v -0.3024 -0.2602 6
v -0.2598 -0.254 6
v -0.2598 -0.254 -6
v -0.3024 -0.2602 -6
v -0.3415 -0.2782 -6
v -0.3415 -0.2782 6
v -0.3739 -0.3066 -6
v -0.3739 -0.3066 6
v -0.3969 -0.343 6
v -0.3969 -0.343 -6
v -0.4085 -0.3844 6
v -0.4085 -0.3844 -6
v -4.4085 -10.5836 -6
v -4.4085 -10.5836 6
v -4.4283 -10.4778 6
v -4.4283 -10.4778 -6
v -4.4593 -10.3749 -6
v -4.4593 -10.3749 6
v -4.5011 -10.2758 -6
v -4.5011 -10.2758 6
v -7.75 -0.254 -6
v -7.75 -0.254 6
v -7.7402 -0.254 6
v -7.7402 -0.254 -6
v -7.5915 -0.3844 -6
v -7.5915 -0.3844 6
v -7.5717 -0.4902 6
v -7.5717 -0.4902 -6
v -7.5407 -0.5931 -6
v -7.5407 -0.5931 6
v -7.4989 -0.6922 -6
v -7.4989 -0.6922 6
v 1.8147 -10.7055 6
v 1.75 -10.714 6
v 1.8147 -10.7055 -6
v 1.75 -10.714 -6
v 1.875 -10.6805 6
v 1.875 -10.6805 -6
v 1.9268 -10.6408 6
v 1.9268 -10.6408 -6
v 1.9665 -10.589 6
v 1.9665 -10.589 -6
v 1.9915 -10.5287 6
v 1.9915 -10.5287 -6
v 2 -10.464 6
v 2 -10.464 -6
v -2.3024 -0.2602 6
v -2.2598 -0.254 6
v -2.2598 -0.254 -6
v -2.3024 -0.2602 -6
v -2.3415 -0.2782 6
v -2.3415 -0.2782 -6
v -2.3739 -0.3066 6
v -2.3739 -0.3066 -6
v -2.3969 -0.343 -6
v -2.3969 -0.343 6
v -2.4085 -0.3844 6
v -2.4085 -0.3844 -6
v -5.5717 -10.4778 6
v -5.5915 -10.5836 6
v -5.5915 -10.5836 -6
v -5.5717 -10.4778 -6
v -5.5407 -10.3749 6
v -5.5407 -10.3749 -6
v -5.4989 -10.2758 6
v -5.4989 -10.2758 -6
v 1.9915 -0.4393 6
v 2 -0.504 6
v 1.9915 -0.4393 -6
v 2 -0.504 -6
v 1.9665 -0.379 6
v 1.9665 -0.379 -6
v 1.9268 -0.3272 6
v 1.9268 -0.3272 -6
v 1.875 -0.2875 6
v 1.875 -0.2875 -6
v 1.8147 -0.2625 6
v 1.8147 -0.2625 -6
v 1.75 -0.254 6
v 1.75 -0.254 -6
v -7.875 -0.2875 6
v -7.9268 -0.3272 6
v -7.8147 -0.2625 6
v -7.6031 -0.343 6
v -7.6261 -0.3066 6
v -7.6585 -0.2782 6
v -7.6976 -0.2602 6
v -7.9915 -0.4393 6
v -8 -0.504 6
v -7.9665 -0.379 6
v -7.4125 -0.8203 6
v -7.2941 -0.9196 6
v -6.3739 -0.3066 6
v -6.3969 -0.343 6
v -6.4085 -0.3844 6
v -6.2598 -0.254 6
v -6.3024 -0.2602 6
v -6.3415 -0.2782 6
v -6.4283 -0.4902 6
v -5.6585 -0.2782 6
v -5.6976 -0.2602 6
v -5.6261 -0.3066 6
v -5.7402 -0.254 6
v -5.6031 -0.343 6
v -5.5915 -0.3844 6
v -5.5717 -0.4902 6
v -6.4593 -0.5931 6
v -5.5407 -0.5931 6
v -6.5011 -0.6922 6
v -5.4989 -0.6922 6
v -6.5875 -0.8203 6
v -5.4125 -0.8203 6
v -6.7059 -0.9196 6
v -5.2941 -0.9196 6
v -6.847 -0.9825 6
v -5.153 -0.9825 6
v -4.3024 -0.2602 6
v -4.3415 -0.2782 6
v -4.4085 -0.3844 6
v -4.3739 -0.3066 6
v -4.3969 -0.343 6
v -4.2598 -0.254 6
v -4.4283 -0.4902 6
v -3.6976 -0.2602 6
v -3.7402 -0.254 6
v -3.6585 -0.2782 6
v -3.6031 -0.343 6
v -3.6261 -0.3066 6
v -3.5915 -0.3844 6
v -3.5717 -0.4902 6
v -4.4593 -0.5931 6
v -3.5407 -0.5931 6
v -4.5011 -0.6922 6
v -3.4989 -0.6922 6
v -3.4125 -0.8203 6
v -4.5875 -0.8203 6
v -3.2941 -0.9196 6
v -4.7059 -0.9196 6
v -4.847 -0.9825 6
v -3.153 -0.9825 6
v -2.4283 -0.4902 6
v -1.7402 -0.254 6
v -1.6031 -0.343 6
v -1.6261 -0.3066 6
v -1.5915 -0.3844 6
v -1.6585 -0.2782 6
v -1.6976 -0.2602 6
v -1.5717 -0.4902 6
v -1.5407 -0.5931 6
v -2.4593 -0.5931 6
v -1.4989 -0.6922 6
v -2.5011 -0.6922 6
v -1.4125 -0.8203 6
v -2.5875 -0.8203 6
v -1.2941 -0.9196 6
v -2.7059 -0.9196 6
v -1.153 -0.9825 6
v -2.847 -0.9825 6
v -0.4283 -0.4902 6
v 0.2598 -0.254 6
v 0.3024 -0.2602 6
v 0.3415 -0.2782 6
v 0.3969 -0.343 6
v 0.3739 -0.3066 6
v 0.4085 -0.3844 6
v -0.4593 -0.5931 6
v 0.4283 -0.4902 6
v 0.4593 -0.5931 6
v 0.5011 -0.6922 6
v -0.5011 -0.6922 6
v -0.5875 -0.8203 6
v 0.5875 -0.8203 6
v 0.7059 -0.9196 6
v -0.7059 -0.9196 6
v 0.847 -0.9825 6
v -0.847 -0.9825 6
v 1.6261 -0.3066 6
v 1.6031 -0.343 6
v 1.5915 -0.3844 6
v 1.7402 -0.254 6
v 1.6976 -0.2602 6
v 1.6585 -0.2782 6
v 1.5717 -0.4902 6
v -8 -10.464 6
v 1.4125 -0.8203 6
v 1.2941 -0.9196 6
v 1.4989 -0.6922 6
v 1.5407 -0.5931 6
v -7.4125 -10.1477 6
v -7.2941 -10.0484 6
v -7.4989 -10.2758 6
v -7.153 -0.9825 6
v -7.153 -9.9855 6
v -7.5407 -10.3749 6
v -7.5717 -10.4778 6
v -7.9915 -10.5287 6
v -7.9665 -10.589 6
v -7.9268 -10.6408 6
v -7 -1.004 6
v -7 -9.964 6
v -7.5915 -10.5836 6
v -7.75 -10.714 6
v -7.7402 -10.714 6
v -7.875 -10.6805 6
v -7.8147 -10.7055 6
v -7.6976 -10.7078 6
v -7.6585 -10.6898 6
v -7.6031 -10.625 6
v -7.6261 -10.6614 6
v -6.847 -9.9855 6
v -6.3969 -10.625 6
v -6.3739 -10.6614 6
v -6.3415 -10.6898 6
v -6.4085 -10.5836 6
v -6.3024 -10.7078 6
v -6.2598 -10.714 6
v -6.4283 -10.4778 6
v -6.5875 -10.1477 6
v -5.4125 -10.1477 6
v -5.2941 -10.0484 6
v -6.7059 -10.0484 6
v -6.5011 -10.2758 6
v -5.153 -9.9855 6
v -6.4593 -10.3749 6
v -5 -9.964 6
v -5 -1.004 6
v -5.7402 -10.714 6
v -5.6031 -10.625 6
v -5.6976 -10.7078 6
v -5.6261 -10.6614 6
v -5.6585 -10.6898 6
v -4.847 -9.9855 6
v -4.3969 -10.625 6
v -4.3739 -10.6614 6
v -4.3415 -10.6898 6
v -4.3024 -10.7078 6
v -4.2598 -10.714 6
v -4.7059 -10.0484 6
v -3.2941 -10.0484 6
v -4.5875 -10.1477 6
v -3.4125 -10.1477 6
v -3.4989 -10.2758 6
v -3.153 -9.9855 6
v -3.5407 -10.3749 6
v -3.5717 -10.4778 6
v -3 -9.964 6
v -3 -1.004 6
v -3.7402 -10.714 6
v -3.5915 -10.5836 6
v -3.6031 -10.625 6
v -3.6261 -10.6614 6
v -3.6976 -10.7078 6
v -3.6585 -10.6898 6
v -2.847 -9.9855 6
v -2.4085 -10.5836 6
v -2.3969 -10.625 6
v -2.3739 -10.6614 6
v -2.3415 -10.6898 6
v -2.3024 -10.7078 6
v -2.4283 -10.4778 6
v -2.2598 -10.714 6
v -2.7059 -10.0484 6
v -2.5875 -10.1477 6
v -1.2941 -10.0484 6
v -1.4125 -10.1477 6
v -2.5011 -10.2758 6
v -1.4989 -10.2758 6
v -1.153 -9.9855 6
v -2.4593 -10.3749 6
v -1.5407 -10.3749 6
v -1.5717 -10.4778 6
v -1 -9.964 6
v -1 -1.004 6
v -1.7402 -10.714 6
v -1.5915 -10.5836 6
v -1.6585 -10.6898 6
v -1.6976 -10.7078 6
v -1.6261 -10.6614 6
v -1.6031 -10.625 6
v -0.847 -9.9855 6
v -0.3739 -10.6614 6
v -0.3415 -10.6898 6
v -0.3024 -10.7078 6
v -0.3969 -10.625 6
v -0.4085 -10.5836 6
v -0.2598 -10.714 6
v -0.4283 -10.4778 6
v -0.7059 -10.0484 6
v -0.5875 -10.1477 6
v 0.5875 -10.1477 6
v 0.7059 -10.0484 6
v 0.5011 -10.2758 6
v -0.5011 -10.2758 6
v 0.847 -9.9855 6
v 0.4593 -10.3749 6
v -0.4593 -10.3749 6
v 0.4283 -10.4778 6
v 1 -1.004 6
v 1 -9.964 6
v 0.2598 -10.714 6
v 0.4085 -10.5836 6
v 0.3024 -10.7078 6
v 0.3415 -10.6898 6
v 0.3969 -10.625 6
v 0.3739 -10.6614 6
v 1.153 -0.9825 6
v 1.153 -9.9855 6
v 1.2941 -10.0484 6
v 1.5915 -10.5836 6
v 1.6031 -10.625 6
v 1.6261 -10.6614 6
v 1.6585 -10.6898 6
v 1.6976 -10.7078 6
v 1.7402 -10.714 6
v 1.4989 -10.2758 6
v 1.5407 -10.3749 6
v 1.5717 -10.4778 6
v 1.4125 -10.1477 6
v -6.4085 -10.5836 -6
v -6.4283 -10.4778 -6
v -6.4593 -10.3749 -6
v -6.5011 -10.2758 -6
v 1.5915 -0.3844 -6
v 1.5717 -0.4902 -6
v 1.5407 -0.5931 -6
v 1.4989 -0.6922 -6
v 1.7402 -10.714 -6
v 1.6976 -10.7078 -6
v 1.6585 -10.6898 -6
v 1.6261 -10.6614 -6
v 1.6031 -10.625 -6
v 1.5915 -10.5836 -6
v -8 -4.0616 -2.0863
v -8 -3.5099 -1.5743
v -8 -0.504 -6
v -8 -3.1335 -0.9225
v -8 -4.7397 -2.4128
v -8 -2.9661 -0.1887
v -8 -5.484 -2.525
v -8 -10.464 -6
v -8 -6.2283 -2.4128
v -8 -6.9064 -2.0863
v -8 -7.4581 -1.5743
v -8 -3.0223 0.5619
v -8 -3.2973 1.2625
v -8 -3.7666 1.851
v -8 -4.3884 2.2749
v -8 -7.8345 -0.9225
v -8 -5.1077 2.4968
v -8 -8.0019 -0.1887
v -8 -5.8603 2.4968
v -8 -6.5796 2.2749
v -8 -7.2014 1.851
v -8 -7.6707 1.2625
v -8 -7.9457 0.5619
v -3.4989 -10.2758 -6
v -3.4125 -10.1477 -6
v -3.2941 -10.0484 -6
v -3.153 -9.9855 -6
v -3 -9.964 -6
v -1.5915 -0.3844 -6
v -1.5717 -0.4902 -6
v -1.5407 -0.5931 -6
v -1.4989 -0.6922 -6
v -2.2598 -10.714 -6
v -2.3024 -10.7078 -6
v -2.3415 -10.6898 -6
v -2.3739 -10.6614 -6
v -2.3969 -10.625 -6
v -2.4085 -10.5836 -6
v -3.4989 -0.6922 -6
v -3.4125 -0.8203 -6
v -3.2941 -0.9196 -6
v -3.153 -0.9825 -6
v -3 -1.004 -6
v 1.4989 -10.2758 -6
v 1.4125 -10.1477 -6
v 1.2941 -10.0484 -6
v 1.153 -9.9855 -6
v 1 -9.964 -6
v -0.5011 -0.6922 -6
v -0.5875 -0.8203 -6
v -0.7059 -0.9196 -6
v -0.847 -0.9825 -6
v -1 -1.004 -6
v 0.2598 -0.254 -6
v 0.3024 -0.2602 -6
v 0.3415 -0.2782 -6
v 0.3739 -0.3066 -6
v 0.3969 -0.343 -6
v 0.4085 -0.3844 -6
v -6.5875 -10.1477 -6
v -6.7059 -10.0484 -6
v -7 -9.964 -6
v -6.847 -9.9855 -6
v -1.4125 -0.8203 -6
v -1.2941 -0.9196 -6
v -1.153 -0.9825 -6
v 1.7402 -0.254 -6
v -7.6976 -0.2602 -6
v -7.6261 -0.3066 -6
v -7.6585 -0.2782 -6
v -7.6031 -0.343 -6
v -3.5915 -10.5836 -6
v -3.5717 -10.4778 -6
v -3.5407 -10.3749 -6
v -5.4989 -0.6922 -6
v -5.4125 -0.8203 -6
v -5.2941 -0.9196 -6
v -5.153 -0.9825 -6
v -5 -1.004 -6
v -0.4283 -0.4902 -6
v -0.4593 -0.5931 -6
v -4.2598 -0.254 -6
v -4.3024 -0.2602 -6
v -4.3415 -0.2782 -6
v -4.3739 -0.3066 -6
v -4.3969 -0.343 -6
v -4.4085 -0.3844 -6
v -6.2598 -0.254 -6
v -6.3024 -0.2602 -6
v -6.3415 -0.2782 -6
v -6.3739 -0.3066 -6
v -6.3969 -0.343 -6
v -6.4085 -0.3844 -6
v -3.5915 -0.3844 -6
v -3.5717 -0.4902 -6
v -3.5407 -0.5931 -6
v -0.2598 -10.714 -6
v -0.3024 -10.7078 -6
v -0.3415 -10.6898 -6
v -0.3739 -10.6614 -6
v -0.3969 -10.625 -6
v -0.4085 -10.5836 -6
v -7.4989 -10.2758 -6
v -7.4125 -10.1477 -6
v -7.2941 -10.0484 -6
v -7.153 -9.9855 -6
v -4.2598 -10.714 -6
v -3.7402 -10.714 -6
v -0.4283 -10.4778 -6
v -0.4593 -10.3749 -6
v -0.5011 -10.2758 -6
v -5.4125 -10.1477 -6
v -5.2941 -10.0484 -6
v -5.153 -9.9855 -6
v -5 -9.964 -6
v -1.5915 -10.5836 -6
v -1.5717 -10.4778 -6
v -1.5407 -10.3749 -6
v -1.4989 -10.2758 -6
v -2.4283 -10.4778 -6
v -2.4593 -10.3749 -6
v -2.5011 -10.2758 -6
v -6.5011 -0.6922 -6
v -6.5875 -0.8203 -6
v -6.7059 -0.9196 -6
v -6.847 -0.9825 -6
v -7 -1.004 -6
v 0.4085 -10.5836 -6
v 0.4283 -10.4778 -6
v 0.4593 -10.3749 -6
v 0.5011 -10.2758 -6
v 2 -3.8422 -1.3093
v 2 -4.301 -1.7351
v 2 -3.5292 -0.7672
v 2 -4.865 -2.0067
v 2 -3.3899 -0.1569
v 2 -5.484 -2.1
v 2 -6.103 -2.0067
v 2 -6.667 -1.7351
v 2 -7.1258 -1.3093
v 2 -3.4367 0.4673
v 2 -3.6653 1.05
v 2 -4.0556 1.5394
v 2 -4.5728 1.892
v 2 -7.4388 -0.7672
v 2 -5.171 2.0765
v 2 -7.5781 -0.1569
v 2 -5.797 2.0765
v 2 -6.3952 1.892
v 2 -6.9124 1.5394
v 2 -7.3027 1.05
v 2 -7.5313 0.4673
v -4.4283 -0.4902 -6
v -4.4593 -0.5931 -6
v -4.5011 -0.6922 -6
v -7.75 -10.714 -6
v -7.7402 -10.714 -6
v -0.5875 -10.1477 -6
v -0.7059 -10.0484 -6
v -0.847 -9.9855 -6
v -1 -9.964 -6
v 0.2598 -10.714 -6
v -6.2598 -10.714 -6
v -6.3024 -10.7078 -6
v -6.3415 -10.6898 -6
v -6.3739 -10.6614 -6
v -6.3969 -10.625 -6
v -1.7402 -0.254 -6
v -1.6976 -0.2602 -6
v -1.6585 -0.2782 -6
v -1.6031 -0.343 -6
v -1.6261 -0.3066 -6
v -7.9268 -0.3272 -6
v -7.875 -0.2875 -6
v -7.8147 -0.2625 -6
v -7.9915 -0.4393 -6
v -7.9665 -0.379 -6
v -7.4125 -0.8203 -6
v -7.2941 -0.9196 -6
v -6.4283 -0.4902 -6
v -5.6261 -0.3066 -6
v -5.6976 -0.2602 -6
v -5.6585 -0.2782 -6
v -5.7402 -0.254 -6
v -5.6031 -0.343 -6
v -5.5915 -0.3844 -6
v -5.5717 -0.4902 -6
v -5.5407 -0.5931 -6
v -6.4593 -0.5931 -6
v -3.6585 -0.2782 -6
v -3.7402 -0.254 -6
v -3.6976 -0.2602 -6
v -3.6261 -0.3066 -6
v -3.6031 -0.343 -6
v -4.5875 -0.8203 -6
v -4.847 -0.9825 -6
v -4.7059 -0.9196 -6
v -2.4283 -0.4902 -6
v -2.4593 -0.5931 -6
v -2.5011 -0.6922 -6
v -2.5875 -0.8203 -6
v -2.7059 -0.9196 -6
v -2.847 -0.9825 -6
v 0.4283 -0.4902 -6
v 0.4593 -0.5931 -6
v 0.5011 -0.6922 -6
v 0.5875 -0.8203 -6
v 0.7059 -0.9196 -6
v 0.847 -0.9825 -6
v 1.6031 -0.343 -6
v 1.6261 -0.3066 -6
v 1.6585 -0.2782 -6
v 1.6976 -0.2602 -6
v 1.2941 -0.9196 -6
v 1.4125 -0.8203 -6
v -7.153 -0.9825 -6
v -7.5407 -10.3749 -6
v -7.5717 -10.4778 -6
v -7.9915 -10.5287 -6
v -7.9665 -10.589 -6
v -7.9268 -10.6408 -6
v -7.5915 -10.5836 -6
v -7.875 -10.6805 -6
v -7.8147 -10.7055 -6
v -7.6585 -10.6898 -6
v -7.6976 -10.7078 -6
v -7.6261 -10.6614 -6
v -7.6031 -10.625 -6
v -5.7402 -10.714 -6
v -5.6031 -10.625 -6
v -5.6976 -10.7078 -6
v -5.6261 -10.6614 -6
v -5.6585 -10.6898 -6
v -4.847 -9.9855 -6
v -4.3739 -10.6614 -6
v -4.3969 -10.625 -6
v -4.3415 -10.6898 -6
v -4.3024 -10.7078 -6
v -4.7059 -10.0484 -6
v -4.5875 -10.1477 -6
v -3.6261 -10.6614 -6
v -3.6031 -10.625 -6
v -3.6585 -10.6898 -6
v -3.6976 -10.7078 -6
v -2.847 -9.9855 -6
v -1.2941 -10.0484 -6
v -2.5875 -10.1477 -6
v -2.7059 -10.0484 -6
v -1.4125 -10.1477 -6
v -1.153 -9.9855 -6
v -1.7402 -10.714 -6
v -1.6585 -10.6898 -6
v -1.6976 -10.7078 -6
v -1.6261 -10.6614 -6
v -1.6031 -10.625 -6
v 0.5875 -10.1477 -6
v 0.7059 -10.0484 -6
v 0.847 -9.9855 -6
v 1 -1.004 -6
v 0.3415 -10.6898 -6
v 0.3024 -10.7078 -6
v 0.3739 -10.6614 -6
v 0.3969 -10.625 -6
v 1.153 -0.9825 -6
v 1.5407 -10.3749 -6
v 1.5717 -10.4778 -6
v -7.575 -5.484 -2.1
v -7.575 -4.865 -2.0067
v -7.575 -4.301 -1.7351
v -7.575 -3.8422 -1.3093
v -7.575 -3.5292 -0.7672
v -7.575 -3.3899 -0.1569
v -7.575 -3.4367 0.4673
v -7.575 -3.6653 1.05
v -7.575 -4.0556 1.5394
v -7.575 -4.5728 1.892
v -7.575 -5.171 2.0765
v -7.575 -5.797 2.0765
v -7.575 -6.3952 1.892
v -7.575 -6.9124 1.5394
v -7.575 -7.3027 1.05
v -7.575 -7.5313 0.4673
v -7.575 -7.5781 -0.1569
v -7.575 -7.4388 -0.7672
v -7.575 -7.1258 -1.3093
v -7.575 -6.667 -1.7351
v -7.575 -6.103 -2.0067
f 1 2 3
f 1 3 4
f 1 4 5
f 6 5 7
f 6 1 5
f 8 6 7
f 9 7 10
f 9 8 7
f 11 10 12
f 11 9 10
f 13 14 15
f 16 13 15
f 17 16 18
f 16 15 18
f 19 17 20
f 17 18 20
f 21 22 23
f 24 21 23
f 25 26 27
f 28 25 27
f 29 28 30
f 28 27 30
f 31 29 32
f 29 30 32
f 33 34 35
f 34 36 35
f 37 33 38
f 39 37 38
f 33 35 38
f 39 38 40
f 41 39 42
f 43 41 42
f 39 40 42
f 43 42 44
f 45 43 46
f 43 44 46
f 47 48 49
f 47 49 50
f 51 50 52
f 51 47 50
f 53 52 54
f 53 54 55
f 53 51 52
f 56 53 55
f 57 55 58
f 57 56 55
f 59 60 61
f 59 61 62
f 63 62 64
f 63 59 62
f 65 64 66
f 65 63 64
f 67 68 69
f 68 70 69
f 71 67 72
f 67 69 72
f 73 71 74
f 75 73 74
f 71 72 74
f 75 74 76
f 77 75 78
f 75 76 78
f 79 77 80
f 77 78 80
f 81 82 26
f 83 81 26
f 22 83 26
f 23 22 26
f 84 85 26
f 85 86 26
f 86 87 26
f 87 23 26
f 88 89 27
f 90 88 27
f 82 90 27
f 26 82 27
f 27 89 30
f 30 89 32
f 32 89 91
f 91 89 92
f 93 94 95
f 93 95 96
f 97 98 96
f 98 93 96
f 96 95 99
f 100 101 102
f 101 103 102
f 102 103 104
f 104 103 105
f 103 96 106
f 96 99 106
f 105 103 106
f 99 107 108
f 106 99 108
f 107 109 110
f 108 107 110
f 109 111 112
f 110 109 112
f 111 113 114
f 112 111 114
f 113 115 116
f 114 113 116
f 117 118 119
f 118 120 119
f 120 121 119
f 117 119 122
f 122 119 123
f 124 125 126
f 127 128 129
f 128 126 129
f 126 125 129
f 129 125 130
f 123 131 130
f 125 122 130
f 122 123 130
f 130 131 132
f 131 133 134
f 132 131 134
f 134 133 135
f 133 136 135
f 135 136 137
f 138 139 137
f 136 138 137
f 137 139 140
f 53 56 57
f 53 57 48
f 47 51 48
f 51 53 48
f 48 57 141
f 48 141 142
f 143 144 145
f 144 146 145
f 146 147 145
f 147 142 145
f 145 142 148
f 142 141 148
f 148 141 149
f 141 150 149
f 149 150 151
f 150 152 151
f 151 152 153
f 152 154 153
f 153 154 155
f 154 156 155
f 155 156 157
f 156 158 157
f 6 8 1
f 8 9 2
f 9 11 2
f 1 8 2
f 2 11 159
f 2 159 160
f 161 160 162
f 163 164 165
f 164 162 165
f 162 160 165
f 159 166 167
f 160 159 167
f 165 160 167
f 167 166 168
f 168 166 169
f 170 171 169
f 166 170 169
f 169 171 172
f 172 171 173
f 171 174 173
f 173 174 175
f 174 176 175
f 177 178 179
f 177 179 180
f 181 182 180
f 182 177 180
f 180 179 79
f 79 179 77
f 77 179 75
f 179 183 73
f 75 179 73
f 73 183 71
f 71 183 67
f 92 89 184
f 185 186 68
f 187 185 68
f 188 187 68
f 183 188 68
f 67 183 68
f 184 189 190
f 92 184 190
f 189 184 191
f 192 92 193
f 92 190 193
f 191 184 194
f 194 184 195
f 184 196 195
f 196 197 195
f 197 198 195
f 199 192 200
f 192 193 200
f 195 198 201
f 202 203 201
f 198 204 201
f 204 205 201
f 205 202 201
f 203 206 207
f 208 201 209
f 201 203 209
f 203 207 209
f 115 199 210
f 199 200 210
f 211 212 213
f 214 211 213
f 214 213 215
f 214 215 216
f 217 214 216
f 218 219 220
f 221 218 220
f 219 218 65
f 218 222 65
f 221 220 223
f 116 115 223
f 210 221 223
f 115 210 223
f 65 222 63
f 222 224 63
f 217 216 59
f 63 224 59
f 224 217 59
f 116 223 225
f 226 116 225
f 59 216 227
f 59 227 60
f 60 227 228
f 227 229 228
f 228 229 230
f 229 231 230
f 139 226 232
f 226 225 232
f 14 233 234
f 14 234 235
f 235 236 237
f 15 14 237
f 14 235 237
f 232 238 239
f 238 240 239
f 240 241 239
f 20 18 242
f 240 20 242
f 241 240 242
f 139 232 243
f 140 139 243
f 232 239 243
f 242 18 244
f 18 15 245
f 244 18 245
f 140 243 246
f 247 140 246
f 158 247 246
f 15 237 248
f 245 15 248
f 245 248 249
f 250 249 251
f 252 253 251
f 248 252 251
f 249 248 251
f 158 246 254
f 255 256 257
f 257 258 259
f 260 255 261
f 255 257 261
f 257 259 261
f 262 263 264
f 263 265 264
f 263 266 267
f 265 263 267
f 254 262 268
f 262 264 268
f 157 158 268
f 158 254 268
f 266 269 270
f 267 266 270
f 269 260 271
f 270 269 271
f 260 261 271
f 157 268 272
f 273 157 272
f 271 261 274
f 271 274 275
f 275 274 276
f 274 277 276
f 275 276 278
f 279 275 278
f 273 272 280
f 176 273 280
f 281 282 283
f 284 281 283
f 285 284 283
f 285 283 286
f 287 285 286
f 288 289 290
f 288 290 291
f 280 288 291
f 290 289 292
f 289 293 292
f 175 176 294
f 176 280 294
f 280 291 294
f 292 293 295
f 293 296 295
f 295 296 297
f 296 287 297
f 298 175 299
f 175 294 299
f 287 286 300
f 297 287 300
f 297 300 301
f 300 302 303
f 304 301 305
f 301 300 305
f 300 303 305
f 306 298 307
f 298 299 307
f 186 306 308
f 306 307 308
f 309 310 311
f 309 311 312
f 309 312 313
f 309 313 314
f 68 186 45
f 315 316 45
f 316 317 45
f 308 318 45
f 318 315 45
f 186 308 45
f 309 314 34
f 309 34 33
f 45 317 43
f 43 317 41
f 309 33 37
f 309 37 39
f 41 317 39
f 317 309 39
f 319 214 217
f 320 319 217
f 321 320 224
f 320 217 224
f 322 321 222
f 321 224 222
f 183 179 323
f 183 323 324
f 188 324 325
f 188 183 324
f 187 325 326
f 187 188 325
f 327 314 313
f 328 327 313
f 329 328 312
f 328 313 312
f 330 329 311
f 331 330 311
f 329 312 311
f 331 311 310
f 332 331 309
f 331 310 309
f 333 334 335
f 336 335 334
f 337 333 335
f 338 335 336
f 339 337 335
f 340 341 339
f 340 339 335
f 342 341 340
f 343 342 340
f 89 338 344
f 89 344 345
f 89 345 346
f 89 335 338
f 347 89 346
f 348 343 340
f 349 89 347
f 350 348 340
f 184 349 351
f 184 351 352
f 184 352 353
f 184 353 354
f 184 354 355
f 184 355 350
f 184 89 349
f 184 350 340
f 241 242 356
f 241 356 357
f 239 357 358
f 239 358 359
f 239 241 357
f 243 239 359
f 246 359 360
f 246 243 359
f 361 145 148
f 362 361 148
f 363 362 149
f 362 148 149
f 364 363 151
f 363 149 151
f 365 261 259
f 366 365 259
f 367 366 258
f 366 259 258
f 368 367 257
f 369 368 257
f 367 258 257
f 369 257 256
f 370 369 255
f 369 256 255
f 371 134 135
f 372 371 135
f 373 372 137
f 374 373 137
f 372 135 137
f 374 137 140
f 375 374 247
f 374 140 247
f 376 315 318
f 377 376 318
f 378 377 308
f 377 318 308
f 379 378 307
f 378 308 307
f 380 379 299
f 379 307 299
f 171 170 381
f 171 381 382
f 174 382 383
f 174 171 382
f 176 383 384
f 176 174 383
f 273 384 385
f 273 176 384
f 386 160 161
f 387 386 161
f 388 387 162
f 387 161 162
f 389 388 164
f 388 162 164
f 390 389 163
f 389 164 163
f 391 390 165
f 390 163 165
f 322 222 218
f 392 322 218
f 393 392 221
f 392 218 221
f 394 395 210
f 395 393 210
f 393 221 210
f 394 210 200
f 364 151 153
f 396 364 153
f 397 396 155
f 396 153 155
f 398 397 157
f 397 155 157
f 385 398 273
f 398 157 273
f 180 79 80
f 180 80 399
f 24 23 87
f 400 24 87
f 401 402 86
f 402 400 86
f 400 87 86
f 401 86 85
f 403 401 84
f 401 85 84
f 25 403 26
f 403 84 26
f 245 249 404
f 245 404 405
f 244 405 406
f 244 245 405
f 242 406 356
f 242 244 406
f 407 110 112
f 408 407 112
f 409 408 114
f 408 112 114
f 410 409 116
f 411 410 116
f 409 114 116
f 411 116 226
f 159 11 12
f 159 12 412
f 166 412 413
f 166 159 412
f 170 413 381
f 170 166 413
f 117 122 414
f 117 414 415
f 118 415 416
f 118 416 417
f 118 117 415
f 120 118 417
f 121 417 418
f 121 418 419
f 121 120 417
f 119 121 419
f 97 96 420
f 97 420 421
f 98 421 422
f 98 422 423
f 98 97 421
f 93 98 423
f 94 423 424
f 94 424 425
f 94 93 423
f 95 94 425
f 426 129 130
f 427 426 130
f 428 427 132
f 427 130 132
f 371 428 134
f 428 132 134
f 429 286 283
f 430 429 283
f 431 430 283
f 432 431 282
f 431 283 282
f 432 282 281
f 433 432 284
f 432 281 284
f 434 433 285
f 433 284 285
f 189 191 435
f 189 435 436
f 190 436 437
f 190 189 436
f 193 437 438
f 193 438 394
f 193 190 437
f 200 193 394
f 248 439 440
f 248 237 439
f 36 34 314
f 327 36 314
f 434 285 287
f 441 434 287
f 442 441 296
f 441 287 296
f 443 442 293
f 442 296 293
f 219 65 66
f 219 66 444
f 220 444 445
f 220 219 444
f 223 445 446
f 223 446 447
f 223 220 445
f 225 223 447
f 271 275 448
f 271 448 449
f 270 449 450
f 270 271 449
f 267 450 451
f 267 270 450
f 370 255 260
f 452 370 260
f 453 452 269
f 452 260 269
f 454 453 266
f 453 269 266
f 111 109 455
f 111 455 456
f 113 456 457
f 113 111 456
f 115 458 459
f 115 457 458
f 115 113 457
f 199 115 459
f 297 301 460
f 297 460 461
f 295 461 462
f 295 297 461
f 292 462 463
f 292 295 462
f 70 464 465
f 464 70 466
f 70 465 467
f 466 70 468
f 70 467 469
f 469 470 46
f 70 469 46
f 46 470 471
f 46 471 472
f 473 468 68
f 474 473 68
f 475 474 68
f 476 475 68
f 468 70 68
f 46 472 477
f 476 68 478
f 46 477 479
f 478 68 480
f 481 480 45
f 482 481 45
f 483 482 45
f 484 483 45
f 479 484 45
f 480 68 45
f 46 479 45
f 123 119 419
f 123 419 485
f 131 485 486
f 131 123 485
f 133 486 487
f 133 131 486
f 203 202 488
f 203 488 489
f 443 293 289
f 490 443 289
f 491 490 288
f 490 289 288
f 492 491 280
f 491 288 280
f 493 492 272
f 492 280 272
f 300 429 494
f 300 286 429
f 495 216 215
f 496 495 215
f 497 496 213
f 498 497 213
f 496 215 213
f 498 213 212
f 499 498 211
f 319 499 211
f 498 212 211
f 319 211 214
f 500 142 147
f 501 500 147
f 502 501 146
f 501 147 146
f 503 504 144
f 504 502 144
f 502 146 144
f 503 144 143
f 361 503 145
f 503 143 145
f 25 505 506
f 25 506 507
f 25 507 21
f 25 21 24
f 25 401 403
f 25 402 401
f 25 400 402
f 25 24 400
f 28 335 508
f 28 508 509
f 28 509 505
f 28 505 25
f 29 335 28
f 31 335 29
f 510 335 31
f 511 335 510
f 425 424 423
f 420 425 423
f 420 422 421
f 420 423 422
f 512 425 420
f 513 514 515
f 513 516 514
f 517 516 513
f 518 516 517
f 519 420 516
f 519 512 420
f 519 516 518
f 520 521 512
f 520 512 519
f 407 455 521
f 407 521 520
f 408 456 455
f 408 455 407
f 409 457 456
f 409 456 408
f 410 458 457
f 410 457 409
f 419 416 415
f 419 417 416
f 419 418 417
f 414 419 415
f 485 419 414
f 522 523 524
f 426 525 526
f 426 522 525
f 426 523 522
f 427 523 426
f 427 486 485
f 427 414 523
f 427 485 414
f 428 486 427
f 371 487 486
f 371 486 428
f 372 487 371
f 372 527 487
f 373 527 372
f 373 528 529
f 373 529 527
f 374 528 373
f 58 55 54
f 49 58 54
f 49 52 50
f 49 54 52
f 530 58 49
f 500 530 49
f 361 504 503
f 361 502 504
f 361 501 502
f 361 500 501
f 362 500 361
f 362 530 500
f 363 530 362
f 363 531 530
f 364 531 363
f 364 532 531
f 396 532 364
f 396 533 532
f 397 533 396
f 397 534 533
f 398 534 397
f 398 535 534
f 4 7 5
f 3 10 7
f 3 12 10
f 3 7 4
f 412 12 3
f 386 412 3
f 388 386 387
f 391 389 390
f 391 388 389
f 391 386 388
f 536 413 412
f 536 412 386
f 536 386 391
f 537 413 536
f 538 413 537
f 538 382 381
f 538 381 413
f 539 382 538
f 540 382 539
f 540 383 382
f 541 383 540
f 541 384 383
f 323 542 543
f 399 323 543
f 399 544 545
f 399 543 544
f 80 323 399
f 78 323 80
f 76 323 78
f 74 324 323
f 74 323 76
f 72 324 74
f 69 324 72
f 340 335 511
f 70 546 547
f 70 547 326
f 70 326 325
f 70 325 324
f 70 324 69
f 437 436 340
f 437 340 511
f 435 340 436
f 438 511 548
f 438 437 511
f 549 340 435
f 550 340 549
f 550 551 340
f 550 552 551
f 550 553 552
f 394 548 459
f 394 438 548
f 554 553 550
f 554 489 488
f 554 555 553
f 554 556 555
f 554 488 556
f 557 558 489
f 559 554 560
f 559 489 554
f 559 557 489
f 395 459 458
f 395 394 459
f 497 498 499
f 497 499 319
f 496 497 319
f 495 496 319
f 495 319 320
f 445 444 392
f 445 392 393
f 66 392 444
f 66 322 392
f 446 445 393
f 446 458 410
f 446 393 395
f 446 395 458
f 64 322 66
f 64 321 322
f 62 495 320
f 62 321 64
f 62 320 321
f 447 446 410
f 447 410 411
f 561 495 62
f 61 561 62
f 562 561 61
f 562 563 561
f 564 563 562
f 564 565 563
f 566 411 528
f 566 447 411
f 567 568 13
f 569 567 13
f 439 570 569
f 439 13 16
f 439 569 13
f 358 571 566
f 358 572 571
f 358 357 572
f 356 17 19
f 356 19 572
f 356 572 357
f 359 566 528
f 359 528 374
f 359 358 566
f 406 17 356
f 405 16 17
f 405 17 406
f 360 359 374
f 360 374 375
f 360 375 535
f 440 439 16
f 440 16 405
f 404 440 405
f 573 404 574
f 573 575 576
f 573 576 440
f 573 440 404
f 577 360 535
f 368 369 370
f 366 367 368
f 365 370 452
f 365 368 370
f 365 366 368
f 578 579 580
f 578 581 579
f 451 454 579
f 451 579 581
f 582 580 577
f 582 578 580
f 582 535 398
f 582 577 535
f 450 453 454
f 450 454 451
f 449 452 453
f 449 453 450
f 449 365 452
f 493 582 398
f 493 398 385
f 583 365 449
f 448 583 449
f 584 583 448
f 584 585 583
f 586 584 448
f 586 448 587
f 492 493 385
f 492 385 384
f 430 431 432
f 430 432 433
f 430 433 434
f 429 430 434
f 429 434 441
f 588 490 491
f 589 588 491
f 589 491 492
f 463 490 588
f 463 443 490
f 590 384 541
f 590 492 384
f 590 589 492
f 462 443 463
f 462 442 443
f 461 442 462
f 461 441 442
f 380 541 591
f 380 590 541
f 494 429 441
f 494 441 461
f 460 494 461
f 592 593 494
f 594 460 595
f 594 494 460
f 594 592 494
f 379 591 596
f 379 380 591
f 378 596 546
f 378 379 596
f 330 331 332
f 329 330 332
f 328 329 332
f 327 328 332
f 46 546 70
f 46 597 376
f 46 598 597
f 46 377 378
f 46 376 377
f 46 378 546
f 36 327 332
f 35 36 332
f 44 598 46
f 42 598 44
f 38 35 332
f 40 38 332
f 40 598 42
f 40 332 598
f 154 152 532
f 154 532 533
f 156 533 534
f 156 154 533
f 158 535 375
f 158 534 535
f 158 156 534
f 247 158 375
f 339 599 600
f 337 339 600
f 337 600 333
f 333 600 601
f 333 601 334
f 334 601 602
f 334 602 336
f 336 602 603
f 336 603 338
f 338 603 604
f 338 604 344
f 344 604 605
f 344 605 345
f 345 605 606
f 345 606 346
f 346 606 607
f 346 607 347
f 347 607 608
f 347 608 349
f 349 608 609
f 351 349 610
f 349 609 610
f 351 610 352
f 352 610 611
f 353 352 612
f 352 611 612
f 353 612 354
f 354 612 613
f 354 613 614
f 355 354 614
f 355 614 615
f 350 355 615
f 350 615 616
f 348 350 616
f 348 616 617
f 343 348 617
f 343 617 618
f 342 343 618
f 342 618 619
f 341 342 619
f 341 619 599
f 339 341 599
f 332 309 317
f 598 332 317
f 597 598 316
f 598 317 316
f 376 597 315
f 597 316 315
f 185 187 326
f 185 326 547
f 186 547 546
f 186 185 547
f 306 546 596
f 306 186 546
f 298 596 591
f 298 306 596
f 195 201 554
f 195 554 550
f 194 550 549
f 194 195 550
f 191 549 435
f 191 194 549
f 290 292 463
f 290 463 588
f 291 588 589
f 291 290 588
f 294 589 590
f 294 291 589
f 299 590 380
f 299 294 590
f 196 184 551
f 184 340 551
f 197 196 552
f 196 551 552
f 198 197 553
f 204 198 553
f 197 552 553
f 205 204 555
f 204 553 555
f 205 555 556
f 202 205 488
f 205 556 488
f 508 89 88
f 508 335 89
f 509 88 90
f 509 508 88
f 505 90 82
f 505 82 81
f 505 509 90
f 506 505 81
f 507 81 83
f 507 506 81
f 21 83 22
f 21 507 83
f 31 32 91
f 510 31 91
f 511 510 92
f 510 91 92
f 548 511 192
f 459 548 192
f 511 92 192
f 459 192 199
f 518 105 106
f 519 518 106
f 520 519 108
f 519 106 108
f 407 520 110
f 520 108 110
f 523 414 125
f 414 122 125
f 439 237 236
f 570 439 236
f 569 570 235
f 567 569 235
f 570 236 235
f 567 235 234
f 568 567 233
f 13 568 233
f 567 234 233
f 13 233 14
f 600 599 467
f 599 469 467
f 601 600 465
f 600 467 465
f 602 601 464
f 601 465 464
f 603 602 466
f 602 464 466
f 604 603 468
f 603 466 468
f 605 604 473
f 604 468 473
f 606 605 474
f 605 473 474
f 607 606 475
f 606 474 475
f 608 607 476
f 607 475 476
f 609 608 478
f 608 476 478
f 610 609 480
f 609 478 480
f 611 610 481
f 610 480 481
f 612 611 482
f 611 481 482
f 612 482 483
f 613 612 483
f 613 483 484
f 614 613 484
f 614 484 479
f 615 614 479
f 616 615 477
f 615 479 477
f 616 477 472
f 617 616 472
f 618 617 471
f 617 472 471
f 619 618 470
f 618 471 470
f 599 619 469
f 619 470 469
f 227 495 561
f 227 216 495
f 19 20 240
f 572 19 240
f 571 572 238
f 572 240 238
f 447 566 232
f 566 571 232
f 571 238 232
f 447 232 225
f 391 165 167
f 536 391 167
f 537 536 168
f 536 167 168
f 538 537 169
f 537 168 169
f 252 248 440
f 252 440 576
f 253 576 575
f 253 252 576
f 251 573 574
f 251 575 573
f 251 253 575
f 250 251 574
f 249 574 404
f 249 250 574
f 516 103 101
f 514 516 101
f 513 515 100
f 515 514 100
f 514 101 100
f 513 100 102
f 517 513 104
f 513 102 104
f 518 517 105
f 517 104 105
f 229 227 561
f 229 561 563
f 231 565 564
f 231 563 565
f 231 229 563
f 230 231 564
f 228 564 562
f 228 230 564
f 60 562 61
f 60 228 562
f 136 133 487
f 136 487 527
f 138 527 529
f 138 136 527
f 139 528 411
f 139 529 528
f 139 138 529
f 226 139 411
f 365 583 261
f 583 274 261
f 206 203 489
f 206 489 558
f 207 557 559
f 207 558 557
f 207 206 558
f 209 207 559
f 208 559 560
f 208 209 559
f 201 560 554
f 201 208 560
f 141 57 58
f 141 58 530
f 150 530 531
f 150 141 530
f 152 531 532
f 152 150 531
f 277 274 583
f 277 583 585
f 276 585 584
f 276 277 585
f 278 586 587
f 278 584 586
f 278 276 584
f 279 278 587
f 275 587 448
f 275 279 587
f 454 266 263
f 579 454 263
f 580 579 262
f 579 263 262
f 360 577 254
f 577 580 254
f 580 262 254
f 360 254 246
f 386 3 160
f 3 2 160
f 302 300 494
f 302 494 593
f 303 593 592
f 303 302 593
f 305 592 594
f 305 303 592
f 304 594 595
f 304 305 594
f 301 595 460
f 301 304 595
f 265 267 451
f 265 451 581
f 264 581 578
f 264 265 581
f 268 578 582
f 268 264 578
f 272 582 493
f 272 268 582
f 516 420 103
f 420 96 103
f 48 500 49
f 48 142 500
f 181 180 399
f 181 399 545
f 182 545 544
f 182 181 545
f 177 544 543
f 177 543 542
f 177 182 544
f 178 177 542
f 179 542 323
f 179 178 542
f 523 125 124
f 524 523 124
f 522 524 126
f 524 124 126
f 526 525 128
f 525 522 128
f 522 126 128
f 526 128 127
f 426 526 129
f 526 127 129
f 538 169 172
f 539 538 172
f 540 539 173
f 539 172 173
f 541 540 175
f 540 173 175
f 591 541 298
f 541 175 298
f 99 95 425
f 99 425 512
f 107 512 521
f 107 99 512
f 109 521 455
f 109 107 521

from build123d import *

# Parameters (mm, degrees)
BOSS_EXTRUDE1_DEPTH             = 6.35
LPATTERN1_COUNT                 = 5
LPATTERN1_PITCH                 = 2
SKETCH4_W                       = 10
SKETCH4_H                       = 6
BOSS_EXTRUDE3_DEPTH             = 6
FILLET1_R                       = 0.25
M5X0_8_TAPPED_HOLE1_D           = 4.2
M5X0_8_TAPPED_HOLE1_CSINK_D     = 5.05
M5X0_8_TAPPED_HOLE1_CSINK_ANGLE = 90


with BuildPart() as part:
    # Sketch1 → Boss-Extrude1 (new, symmetric)
    with BuildSketch(Plane.XY):
        with BuildLine():
            Line((0, 0), (0, -0.254))
            Line((0, -0.254), (0.259824575, -0.254))
            ThreePointArc((0.259824575, -0.254), (0.358731646, -0.291228588), (0.408543109, -0.384434783))
            ThreePointArc((0.408543109, -0.384434783), (0.442388286, -0.542062154), (0.501123596, -0.692202247))
            ThreePointArc((0.501123596, -0.692202247), (0.705850588, -0.919639059), (1, -1.004))
            Line((1, -1.004), (1, 0))
            Line((1, 0), (1, 0.516))
            Line((1, 0.516), (0, 0.516))
            Line((0, 0.516), (0, 0))
        make_face()
    extrude(amount=BOSS_EXTRUDE1_DEPTH, both=True)

    # Mirror1: part across plane


with BuildPart() as part_1:
    add(part.part)
    add(part.part.mirror(Plane(origin=(1, 0.516, 6.35), x_dir=(0, 0, 1), z_dir=(-1, 0, 0))))


with BuildPart() as lpattern1_1:
    # LPattern1: pattern copy
    add(part_1.part.moved(Location(Vector(-1, 0, 0) * (1 * LPATTERN1_PITCH))))


with BuildPart() as lpattern1_2:
    # LPattern1: pattern copy
    add(part_1.part.moved(Location(Vector(-1, 0, 0) * (2 * LPATTERN1_PITCH))))


with BuildPart() as lpattern1_3:
    # LPattern1: pattern copy
    add(part_1.part.moved(Location(Vector(-1, 0, 0) * (3 * LPATTERN1_PITCH))))


with BuildPart() as lpattern1_4:
    # LPattern1: pattern copy
    add(part_1.part.moved(Location(Vector(-1, 0, 0) * (4 * LPATTERN1_PITCH))))


with BuildPart() as lpattern1_1_1:
    add(lpattern1_1.part)

    # Combine1: union LPattern1_4, part, LPattern1_3, LPattern1_2
    add(lpattern1_4.part)
    add(part_1.part)
    add(lpattern1_3.part)
    add(lpattern1_2.part)


with BuildPart() as body_2:
    # Sketch4 → Boss-Extrude3 (new, symmetric)
    with BuildSketch(Plane.XY):
        with Locations((-3, -2.484)):
            Rectangle(SKETCH4_W, SKETCH4_H)
    extrude(amount=BOSS_EXTRUDE3_DEPTH, both=True)

    # Combine2: cut LPattern1_1
    add(lpattern1_1_1.part, mode=Mode.SUBTRACT)

    # Mirror2: body 2 across plane


with BuildPart() as body_2_1:
    add(body_2.part)
    add(body_2.part.mirror(Plane(origin=(2, -5.484, 6), x_dir=(0, 0, 1), z_dir=(0, 1, 0))))

    # Fillet1
    fillet1_edges = [body_2_1.edges().sort_by_distance(p)[0] for p in [
        (2, -10.714, 0),
        (-8, -10.714, 0),
        (-8, -0.254, 0),
        (2, -0.254, 0),
    ]]
    fillet(fillet1_edges, radius=FILLET1_R)

    # M5x0.8 Tapped Hole1 (through all)
    with Locations(Plane.ZY.offset(8)):
        with Locations((0, -5.484)):
            CounterSinkHole(M5X0_8_TAPPED_HOLE1_D / 2, M5X0_8_TAPPED_HOLE1_CSINK_D / 2, counter_sink_angle=M5X0_8_TAPPED_HOLE1_CSINK_ANGLE)


solid = body_2_1.part
